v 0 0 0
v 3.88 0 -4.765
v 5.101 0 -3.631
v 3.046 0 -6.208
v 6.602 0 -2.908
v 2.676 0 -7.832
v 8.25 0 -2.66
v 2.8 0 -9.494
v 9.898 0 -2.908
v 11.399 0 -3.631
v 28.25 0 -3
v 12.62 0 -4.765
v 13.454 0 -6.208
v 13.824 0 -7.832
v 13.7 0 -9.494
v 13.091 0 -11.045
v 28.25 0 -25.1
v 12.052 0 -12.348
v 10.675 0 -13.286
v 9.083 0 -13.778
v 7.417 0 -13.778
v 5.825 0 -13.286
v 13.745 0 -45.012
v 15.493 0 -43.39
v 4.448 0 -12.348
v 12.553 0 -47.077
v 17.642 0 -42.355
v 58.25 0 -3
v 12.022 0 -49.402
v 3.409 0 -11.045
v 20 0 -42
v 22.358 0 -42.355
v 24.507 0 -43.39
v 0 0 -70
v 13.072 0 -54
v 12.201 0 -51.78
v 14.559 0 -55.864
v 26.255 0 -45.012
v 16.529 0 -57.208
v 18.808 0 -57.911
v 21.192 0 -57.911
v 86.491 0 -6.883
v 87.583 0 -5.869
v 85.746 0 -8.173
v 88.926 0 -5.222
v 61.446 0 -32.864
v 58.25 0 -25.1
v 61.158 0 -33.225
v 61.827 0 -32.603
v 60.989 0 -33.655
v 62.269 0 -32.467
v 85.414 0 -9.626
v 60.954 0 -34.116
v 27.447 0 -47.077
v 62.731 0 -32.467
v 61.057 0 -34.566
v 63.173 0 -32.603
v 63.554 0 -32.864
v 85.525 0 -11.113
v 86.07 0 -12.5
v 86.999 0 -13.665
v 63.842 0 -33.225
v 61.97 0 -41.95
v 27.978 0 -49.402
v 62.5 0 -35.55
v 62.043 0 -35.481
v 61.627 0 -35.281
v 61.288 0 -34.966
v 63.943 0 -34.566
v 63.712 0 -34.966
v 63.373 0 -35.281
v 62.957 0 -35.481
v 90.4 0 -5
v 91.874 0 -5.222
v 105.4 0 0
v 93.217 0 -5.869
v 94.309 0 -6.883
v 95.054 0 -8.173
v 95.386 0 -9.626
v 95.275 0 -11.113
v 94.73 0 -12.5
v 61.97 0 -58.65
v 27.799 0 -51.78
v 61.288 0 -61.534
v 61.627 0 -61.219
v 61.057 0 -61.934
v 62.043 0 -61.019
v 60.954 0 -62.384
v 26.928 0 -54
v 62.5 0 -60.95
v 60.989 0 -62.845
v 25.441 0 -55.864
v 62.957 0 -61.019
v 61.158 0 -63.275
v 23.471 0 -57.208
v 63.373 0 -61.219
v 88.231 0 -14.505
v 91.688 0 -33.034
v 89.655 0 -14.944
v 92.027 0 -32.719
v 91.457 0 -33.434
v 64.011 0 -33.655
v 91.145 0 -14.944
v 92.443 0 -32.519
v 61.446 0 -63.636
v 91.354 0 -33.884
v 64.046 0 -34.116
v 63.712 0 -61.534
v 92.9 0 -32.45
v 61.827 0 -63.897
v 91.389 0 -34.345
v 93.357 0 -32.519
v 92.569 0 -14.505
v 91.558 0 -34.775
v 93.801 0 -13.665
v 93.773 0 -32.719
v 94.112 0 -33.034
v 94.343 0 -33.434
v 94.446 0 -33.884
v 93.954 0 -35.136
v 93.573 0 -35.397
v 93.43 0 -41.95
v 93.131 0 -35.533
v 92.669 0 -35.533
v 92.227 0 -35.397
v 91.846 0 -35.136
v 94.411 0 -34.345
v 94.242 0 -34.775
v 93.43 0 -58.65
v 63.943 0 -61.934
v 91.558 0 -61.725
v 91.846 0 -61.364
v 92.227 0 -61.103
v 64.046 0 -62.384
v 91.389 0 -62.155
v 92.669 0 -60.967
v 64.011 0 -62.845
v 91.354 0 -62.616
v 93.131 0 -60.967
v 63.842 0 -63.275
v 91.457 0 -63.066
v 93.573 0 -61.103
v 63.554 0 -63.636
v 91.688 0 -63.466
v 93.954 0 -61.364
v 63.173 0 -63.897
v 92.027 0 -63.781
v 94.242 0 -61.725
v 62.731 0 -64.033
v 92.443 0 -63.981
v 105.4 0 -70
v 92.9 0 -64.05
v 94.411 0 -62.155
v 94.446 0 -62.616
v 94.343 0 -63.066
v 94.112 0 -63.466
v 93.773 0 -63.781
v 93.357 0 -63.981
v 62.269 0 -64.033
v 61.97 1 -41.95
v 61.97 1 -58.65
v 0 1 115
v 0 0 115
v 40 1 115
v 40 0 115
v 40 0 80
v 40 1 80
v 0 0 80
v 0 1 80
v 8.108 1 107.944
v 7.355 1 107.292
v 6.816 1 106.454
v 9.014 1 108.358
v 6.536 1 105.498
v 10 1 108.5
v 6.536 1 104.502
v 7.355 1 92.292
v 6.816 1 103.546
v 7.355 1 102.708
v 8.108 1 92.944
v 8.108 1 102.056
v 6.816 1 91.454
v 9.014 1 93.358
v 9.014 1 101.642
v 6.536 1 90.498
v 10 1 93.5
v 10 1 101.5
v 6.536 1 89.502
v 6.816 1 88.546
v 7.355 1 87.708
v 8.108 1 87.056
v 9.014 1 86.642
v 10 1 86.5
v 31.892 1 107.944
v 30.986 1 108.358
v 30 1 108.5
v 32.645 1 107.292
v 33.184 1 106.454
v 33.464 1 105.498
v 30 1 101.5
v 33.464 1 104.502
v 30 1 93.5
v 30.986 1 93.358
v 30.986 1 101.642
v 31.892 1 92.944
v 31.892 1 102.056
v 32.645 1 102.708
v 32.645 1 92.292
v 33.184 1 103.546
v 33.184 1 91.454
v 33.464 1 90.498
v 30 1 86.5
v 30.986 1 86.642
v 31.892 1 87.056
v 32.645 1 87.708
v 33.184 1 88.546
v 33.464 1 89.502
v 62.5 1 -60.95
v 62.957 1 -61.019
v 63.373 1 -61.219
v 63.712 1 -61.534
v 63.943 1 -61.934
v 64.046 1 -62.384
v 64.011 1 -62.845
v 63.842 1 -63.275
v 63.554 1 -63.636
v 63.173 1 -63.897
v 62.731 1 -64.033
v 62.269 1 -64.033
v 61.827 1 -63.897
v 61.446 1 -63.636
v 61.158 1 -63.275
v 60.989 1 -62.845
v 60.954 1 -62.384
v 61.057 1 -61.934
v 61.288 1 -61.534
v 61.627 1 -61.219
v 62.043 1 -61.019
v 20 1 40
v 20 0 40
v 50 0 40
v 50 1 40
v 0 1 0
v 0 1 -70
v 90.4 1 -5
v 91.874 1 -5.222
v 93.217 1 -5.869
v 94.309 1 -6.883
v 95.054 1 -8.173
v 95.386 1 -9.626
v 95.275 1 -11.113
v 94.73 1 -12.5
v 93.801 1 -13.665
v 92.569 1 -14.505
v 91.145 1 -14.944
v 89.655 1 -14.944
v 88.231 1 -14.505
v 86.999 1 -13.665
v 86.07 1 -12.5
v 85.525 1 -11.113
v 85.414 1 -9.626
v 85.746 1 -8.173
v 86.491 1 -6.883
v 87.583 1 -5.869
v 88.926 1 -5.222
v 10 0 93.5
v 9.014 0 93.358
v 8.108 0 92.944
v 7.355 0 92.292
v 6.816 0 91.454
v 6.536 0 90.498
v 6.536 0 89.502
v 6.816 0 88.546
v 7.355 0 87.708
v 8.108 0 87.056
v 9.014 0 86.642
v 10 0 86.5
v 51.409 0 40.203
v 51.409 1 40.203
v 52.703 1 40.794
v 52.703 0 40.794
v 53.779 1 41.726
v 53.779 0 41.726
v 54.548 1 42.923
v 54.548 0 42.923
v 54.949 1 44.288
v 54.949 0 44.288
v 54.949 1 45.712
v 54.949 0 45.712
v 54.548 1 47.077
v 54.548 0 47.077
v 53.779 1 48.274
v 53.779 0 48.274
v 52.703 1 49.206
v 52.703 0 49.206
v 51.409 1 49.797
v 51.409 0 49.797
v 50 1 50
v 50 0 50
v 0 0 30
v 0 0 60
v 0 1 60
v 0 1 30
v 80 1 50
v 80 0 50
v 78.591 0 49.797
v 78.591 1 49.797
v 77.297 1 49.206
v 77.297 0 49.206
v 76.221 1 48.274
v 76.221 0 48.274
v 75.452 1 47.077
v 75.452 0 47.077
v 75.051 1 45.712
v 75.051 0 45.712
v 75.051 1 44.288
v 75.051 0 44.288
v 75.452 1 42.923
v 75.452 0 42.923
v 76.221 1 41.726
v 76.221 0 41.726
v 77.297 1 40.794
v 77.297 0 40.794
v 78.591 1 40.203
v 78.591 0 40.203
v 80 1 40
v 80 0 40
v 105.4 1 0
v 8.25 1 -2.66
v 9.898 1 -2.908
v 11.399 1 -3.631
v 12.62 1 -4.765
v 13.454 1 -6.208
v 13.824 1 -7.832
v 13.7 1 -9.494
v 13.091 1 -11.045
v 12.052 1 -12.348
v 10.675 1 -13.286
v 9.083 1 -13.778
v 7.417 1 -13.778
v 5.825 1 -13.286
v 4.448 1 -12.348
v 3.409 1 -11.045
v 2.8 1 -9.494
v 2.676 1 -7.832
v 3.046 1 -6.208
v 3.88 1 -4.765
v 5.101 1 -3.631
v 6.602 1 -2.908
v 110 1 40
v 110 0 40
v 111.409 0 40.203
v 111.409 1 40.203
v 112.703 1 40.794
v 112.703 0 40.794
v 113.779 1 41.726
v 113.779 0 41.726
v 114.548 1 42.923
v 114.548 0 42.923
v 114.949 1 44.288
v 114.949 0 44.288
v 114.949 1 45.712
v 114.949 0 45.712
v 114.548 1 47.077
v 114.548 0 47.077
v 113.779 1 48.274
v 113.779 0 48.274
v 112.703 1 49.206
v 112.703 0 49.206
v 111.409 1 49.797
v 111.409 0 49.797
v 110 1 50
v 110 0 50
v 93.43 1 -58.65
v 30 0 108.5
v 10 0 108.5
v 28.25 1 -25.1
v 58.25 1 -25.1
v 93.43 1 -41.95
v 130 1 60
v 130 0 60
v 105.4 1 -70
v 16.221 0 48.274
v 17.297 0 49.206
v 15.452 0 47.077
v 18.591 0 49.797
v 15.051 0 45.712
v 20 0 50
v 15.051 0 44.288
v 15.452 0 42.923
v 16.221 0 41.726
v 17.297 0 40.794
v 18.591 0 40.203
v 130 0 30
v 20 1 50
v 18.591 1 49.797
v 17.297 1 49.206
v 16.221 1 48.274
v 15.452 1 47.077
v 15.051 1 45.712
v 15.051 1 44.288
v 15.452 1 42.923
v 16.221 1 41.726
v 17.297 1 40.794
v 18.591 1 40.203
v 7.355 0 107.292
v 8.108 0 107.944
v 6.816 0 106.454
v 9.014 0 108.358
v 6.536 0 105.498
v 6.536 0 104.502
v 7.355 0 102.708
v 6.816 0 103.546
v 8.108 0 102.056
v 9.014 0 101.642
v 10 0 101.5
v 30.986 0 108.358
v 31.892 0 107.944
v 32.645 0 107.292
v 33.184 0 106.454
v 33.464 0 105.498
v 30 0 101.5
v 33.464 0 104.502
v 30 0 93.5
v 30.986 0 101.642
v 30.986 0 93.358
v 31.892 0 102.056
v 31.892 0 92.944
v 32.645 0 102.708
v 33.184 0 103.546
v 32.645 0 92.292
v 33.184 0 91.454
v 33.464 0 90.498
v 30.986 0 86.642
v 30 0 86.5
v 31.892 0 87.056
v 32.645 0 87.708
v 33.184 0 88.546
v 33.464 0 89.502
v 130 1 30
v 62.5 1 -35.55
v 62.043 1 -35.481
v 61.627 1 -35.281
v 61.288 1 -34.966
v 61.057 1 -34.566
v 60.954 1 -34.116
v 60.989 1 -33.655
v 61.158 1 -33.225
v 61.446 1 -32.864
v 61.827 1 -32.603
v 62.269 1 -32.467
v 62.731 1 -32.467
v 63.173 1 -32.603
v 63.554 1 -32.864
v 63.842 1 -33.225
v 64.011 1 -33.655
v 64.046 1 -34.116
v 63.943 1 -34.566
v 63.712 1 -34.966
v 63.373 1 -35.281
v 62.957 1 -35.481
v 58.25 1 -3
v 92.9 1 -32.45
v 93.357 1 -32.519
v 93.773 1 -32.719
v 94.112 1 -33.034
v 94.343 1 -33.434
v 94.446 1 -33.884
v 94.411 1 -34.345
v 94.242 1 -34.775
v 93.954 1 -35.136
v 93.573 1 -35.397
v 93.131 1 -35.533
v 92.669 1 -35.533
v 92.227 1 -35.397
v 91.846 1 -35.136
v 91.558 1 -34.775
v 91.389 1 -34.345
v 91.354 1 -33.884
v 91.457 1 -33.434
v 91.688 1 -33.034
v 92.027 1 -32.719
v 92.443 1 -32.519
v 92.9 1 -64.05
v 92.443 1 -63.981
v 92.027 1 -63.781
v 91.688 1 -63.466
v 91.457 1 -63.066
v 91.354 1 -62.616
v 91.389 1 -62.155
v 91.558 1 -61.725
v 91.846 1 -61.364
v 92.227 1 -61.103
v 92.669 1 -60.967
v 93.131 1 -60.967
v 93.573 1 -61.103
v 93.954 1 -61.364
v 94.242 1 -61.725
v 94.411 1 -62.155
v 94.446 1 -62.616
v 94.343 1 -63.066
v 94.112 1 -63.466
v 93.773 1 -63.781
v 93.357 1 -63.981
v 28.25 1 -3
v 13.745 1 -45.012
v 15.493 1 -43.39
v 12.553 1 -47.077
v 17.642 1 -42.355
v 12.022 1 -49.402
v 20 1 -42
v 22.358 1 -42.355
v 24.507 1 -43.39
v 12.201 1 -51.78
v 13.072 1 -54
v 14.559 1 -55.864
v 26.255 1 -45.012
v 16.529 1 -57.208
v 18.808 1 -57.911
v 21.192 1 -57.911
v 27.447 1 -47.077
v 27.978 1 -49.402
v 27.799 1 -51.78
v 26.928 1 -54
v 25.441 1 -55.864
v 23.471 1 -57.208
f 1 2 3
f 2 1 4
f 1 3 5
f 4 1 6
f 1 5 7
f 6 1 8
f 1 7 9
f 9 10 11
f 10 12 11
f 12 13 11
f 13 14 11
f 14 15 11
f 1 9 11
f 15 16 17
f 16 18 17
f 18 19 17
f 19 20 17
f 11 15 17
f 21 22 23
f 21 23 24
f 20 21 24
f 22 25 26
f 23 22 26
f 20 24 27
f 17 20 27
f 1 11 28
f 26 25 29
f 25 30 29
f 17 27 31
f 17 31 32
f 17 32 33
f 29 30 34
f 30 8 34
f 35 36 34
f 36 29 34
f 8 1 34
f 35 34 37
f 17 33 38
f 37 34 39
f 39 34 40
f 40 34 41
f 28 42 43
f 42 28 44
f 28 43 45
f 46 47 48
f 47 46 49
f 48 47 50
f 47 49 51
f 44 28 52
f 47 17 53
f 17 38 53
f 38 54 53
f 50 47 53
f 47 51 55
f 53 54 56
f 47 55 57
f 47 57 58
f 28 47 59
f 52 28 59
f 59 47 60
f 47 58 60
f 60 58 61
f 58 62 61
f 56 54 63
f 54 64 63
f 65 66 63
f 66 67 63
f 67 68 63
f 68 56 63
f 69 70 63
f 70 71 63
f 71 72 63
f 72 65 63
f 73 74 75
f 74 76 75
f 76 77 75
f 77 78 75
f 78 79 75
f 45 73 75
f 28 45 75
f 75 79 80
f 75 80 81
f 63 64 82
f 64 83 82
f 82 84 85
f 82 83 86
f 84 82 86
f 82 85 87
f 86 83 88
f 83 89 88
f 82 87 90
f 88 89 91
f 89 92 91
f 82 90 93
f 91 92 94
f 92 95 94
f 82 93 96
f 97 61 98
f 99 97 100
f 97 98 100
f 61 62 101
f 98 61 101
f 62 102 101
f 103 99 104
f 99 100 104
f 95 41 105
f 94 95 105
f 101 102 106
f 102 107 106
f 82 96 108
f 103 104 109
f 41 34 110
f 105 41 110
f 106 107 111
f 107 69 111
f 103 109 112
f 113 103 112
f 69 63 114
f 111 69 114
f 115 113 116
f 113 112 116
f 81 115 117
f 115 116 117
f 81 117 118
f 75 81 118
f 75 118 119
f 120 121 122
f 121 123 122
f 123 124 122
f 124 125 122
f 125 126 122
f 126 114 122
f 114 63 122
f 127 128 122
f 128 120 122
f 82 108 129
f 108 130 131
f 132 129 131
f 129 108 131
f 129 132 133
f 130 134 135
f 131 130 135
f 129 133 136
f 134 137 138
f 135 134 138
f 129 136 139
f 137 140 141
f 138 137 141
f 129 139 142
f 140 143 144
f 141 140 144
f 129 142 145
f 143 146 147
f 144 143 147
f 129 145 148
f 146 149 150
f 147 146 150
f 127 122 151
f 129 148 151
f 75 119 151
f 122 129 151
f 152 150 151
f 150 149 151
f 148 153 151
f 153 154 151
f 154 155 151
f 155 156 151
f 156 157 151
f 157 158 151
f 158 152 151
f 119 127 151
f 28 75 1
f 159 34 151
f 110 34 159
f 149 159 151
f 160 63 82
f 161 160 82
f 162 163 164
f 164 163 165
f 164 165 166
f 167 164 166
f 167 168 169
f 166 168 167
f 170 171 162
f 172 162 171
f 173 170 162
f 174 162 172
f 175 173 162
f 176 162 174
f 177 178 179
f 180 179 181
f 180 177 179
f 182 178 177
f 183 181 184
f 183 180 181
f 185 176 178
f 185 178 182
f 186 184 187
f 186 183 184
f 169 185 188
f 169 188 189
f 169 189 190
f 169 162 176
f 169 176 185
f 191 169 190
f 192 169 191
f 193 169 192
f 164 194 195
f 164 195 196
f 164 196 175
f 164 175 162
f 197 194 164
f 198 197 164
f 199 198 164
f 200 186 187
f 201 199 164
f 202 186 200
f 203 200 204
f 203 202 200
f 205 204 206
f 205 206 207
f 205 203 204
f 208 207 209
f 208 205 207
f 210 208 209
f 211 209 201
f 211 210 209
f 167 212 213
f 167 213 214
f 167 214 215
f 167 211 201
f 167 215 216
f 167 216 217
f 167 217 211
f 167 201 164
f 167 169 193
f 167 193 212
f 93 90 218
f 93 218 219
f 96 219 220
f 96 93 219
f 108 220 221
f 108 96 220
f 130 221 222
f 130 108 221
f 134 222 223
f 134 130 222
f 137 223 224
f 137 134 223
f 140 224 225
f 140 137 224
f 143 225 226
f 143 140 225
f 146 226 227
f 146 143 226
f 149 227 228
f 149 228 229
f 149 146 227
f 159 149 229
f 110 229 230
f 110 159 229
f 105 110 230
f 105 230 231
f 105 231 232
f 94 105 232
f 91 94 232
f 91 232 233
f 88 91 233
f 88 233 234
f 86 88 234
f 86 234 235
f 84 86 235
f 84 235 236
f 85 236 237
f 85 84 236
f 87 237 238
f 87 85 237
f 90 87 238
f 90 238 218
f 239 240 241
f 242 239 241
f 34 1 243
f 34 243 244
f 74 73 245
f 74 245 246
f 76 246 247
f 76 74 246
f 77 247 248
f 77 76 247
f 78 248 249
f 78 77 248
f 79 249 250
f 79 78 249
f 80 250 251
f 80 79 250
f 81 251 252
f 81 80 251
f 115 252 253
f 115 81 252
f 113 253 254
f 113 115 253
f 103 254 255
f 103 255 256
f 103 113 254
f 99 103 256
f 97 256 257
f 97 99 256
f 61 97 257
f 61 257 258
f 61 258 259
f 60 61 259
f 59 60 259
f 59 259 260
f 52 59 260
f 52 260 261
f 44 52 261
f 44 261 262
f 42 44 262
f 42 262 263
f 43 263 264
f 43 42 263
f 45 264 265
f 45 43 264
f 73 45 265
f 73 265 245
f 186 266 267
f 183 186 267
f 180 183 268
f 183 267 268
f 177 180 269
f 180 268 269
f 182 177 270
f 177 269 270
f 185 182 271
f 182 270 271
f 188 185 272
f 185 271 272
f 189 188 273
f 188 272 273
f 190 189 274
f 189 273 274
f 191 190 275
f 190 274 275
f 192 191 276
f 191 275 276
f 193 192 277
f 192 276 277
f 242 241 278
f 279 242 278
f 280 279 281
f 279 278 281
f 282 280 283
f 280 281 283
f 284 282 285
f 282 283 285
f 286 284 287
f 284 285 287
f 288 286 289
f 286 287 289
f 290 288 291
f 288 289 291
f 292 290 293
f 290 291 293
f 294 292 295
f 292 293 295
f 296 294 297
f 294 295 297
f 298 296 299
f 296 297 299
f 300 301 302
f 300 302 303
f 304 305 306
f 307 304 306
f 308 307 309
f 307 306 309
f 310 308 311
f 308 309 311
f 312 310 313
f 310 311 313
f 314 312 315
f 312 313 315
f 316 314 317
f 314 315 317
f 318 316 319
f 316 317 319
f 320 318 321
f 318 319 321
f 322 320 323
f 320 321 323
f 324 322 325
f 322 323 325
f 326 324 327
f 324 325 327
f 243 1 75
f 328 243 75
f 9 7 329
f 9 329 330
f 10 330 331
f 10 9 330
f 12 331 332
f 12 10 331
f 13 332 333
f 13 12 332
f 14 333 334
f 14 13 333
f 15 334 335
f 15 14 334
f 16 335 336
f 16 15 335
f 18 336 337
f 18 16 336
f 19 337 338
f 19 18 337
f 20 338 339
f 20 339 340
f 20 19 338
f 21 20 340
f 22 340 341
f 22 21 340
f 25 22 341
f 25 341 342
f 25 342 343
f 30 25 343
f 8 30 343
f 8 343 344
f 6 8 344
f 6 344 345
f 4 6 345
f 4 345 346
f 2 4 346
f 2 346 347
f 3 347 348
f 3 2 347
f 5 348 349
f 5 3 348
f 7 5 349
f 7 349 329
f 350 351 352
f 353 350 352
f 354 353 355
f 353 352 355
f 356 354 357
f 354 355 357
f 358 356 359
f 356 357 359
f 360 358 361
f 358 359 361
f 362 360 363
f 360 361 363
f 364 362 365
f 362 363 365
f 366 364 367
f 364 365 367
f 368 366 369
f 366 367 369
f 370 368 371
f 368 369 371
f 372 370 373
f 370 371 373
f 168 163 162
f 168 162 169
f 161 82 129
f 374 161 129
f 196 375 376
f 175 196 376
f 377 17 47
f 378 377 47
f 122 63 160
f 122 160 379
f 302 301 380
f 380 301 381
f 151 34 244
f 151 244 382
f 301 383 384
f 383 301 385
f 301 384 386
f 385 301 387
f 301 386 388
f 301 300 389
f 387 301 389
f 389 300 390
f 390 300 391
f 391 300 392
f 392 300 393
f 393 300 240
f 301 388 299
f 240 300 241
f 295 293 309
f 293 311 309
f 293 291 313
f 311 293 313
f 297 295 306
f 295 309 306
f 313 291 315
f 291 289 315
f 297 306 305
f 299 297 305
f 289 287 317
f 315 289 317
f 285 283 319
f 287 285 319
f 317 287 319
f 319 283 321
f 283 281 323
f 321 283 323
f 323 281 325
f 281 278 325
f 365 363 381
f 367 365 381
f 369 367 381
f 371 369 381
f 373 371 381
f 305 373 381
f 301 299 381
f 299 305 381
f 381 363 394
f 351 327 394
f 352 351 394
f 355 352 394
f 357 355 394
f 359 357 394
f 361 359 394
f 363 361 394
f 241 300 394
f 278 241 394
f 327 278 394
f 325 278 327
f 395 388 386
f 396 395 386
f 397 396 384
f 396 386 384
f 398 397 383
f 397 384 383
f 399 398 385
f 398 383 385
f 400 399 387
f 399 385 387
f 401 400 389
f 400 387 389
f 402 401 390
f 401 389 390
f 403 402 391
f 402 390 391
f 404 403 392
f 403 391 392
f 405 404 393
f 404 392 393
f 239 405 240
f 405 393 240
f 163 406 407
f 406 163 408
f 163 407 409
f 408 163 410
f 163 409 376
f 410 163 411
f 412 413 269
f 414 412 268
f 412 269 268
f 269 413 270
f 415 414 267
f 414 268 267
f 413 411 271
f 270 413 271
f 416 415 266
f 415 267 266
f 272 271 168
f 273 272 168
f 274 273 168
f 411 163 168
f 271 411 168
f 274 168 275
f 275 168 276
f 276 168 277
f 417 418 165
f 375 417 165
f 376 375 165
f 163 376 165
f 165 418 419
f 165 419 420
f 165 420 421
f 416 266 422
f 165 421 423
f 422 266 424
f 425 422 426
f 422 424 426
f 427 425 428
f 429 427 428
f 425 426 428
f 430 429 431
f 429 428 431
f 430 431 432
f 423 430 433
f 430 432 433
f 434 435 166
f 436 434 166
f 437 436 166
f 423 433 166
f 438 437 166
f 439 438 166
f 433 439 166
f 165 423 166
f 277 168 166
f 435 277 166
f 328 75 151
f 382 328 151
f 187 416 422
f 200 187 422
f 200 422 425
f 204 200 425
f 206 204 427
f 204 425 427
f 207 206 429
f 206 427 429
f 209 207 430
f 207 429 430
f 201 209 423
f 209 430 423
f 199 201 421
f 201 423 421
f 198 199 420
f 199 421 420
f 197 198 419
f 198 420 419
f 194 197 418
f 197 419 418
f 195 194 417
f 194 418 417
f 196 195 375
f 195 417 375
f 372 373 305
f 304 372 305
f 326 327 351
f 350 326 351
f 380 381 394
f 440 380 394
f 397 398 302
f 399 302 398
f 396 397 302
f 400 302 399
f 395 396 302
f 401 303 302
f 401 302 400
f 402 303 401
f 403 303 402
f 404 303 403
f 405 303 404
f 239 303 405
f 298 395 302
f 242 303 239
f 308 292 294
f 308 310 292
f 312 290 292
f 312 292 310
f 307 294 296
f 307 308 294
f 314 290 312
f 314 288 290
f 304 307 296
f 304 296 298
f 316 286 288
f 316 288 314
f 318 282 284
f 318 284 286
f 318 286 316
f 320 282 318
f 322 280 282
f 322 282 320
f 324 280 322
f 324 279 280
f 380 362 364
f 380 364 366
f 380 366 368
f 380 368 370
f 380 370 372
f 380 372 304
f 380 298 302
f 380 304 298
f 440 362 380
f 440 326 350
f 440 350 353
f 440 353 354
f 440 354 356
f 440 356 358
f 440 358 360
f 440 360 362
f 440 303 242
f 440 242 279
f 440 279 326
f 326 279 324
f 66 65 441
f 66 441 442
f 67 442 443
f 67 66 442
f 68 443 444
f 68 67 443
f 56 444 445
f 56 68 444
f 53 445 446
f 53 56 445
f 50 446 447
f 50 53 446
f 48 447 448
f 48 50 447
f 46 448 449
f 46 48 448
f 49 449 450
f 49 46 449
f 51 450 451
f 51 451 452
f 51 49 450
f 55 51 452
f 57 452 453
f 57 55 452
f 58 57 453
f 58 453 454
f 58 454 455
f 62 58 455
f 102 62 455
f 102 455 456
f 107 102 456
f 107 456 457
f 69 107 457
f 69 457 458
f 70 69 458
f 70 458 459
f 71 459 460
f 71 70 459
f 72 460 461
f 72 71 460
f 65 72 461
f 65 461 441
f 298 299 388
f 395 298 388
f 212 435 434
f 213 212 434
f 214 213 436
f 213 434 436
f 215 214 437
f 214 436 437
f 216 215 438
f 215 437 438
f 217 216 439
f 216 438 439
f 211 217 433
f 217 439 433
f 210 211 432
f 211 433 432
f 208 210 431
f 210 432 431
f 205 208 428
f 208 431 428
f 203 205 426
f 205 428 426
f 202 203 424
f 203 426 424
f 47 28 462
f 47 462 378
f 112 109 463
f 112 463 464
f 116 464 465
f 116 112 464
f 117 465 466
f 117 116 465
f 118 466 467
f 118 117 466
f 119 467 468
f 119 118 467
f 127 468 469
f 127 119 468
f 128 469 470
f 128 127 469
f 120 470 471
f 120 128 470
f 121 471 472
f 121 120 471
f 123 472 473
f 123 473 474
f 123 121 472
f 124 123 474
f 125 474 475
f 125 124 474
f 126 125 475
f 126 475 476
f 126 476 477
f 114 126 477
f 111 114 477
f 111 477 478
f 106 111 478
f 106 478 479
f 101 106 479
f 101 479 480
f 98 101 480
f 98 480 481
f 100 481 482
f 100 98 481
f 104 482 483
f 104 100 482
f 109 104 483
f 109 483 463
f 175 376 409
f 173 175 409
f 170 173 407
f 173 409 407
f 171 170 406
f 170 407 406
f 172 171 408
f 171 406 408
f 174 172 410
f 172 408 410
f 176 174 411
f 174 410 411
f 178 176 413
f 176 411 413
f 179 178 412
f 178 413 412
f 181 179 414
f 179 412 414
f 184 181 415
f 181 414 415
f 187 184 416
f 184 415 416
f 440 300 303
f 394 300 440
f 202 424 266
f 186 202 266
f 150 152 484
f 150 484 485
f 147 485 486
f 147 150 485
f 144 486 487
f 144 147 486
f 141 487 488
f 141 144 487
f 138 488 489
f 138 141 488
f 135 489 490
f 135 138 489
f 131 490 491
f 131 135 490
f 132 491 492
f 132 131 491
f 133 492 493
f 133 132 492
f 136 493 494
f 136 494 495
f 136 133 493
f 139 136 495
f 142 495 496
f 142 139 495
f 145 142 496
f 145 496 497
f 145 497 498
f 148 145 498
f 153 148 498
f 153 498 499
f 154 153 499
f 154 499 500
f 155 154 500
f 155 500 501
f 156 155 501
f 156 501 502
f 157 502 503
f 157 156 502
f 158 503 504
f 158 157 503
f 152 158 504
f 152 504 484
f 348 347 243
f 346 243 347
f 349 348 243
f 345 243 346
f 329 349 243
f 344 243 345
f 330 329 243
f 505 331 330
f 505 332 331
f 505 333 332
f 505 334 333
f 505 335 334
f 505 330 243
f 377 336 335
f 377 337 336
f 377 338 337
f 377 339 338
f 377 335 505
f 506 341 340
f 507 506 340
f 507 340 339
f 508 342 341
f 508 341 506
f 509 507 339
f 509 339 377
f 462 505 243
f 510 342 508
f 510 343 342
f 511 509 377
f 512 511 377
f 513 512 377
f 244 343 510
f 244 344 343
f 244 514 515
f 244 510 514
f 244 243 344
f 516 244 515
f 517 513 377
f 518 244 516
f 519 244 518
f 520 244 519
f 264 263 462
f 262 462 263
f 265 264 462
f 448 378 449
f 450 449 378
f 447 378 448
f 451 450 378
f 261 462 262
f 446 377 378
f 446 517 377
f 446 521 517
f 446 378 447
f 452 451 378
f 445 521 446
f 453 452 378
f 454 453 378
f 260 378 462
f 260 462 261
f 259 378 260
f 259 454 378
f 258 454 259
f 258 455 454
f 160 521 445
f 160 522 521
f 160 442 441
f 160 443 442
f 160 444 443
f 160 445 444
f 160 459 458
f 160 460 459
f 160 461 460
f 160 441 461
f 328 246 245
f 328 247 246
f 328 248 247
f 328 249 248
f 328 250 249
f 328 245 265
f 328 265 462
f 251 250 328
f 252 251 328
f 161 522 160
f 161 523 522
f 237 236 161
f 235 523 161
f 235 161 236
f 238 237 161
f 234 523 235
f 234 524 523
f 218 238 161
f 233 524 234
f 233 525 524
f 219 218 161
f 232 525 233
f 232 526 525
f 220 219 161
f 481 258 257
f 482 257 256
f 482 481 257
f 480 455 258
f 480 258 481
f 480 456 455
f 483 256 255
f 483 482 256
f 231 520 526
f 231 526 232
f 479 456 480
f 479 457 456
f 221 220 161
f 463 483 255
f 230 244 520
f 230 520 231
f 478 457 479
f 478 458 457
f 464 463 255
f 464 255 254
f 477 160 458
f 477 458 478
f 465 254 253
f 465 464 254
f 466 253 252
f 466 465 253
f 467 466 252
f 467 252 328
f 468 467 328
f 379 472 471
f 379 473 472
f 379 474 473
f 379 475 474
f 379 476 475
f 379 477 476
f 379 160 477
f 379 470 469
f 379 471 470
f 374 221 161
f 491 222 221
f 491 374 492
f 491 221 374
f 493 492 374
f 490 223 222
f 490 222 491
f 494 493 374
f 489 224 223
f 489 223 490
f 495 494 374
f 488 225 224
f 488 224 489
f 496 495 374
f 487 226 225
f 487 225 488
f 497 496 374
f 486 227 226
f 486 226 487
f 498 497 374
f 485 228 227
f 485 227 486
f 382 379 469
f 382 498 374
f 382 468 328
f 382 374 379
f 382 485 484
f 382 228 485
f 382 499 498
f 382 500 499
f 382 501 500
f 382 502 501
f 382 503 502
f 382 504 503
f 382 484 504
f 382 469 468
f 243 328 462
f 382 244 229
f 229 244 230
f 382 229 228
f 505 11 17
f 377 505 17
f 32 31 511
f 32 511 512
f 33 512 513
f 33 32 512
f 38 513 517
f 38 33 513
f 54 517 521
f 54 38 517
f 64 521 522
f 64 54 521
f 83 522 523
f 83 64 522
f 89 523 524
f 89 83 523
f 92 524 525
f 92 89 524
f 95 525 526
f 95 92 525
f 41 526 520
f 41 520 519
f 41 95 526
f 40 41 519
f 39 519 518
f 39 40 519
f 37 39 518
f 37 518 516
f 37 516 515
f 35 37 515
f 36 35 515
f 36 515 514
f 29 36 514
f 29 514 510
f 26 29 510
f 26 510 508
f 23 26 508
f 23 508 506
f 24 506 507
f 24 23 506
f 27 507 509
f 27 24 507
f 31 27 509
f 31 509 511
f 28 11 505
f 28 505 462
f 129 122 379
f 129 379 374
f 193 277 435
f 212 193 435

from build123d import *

# Parameters (mm, degrees)
SKETCH1_W           = 105.4
SKETCH1_H           = 70
SKETCH1_R           = 5.59
SKETCH1_R_2         = 8
SKETCH1_R_3         = 5
SKETCH1_R_4         = 1.55
SKETCH1_W_2         = 31.46
SKETCH1_H_2         = 16.7
SKETCH1_W_3         = 30
SKETCH1_H_3         = 22.1
BOSS_EXTRUDE1_DEPTH = 1
SKETCH2_W           = 130
SKETCH2_H           = 30
BOSS_EXTRUDE2_DEPTH = 1
SKETCH3_W           = 40
SKETCH3_H           = 35
BOSS_EXTRUDE3_DEPTH = 1


with BuildPart() as part:
    # Sketch1 → Boss-Extrude1 (new body)
    with BuildSketch(Plane(origin=(0, 0, 0), x_dir=(1, 0, 0), z_dir=(0, 1, 0))):
        with Locations((52.7, 35)):
            Rectangle(SKETCH1_W, SKETCH1_H)
        with Locations(Location((8.25, 8.25, 0), (0, 0, 270))):
            Circle(SKETCH1_R, mode=Mode.SUBTRACT)
        with Locations(Location((20, 50, 0), (0, 0, 270))):
            Circle(SKETCH1_R_2, mode=Mode.SUBTRACT)
        with Locations(Location((90.4, 10, 0), (0, 0, 270))):
            Circle(SKETCH1_R_3, mode=Mode.SUBTRACT)
        with Locations(Location((62.5, 62.5, 0), (0, 0, 270))):
            Circle(SKETCH1_R_4, mode=Mode.SUBTRACT)
        with Locations(Location((92.9, 62.5, 0), (0, 0, 90))):
            Circle(SKETCH1_R_4, mode=Mode.SUBTRACT)
        with Locations(Location((92.9, 34, 0), (0, 0, 270))):
            Circle(SKETCH1_R_4, mode=Mode.SUBTRACT)
        with Locations(Location((62.5, 34, 0), (0, 0, 90))):
            Circle(SKETCH1_R_4, mode=Mode.SUBTRACT)
        with Locations((77.7, 50.3)):
            Rectangle(SKETCH1_W_2, SKETCH1_H_2, mode=Mode.SUBTRACT)
        with Locations((43.25, 14.05)):
            Rectangle(SKETCH1_W_3, SKETCH1_H_3, mode=Mode.SUBTRACT)
    extrude(amount=BOSS_EXTRUDE1_DEPTH)


with BuildPart() as body_2:
    # Sketch2 → Boss-Extrude2 (new body)
    with BuildSketch(Plane(origin=(0, 0, 0), x_dir=(1, 0, 0), z_dir=(0, 1, 0))):
        with Locations((65, -45)):
            Rectangle(SKETCH2_W, SKETCH2_H)
        with BuildLine():
            Line((20, -40), (50, -40))
            ThreePointArc((50, -40), (55, -45), (50, -50))
            Line((50, -50), (20, -50))
            ThreePointArc((20, -50), (15, -45), (20, -40))
        make_face(mode=Mode.SUBTRACT)
        with BuildLine():
            Line((80, -40), (110, -40))
            ThreePointArc((110, -40), (115, -45), (110, -50))
            Line((110, -50), (80, -50))
            ThreePointArc((80, -50), (75, -45), (80, -40))
        make_face(mode=Mode.SUBTRACT)
    extrude(amount=BOSS_EXTRUDE2_DEPTH)


with BuildPart() as body_3:
    # Sketch3 → Boss-Extrude3 (new body)
    with BuildSketch(Plane(origin=(0, 0, 0), x_dir=(1, 0, 0), z_dir=(0, 1, 0))):
        with Locations((20, -97.5)):
            Rectangle(SKETCH3_W, SKETCH3_H)
        with BuildLine():
            Line((10, -86.5), (30, -86.5))
            ThreePointArc((30, -86.5), (33.5, -90), (30, -93.5))
            Line((30, -93.5), (10, -93.5))
            ThreePointArc((10, -93.5), (6.5, -90), (10, -86.5))
        make_face(mode=Mode.SUBTRACT)
        with BuildLine():
            Line((10, -101.5), (30, -101.5))
            ThreePointArc((30, -101.5), (33.5, -105), (30, -108.5))
            Line((30, -108.5), (10, -108.5))
            ThreePointArc((10, -108.5), (6.5, -105), (10, -101.5))
        make_face(mode=Mode.SUBTRACT)
    extrude(amount=BOSS_EXTRUDE3_DEPTH)


solid = Compound([part.part, body_2.part, body_3.part])
